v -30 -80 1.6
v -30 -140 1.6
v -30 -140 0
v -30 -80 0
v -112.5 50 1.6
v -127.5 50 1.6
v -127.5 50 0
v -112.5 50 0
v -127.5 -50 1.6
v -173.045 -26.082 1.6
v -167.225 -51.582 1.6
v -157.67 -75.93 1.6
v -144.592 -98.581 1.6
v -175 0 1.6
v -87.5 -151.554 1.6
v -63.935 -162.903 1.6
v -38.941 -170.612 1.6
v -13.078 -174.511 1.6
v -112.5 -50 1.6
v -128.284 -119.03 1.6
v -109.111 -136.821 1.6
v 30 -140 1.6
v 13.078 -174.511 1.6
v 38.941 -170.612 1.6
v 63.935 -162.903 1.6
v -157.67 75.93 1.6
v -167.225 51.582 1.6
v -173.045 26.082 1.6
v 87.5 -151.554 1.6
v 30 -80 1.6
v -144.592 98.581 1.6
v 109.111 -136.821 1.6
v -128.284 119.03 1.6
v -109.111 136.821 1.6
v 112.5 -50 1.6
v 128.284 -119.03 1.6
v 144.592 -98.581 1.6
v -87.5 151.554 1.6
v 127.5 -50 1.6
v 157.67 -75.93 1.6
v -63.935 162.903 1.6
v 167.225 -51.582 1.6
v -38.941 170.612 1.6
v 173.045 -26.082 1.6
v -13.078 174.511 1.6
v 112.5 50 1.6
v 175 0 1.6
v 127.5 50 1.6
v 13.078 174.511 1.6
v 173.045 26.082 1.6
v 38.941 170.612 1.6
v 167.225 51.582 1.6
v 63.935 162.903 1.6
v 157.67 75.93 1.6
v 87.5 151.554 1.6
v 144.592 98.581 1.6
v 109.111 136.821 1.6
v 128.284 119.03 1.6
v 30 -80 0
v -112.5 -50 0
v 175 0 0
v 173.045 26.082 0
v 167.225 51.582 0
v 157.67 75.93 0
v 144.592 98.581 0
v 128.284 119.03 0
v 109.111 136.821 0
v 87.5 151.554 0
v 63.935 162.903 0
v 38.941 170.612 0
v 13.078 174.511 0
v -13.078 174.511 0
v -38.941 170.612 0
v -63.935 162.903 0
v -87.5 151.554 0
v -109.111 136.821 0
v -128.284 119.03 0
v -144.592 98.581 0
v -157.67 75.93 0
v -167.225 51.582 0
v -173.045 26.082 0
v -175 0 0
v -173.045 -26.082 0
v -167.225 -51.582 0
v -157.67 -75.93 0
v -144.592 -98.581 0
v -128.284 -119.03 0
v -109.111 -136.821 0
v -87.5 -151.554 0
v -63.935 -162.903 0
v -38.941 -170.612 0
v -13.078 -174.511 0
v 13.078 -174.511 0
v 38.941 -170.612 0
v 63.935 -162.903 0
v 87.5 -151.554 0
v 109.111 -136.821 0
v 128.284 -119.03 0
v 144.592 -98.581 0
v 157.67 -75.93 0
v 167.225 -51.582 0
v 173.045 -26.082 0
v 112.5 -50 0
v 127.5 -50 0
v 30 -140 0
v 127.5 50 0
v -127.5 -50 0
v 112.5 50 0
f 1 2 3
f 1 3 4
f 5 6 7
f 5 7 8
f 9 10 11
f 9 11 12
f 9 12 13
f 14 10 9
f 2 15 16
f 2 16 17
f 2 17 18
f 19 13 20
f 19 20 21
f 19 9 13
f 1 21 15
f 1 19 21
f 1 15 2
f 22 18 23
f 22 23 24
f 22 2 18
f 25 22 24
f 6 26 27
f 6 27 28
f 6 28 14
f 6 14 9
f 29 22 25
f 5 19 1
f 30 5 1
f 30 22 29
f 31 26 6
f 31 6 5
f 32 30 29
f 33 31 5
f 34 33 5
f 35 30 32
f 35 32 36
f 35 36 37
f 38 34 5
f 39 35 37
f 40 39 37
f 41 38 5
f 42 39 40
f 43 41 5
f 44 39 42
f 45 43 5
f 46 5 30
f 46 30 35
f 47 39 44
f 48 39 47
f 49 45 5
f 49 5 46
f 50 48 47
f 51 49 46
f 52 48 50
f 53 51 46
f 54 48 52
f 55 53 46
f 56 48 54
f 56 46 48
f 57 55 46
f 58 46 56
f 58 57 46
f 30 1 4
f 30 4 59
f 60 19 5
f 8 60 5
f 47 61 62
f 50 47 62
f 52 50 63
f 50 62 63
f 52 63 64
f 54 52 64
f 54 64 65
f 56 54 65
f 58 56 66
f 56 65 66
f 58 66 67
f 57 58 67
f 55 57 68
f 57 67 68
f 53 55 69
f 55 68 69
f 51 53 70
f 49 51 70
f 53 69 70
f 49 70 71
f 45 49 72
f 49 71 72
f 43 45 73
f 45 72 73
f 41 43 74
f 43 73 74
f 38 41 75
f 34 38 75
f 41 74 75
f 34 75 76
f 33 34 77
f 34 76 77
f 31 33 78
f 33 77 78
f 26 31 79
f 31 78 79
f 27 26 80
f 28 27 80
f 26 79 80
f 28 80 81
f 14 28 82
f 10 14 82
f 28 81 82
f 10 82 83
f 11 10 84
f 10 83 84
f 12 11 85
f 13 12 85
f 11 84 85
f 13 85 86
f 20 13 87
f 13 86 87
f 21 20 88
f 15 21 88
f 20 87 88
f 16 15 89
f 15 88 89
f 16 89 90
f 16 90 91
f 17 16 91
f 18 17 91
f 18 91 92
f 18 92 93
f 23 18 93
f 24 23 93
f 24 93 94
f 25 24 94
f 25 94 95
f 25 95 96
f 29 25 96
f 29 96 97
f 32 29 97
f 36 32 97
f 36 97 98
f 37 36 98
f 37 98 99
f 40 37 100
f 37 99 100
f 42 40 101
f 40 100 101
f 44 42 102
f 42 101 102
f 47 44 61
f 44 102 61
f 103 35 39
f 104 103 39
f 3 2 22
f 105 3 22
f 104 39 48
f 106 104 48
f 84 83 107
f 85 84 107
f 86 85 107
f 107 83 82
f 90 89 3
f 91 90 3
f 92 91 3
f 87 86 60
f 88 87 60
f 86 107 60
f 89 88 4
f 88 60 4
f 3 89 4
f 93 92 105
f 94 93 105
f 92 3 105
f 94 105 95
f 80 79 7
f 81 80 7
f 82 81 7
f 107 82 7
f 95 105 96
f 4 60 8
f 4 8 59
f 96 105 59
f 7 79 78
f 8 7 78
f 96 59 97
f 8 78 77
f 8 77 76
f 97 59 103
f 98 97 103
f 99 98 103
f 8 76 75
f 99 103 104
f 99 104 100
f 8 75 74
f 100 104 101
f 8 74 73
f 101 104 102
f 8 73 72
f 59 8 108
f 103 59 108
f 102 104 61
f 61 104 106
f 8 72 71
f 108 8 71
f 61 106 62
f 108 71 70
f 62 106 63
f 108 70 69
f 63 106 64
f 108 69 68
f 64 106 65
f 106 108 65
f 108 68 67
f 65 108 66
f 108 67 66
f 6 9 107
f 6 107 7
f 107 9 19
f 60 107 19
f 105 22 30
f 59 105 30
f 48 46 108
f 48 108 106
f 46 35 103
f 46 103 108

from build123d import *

# Parameters (mm, degrees)
SKETCH1_R           = 175
BOSS_EXTRUDE1_DEPTH = 1.6
SKETCH2_W           = 15
SKETCH2_H           = 100
CUT_EXTRUDE1_DEPTH  = 1.6
SKETCH3_W           = 60
SKETCH3_H           = 60
CUT_EXTRUDE2_DEPTH  = 2.6


with BuildPart() as part:
    # Sketch1 → Boss-Extrude1 (new body)
    with BuildSketch(Plane.XY):
        Circle(SKETCH1_R)
    extrude(amount=BOSS_EXTRUDE1_DEPTH)

    # Sketch2 → Cut-Extrude1 (cut)
    with BuildSketch(Plane.XY.offset(1.6)):
        with Locations((-120, 0)):
            Rectangle(SKETCH2_W, SKETCH2_H)
        with Locations((120, 0)):
            Rectangle(SKETCH2_W, SKETCH2_H)
    extrude(amount=-CUT_EXTRUDE1_DEPTH, mode=Mode.SUBTRACT)

    # Sketch3 → Cut-Extrude2 (cut, through all)
    with BuildSketch(Plane.XY.offset(1.6)):
        with Locations((0, -110)):
            Rectangle(SKETCH3_W, SKETCH3_H)
    extrude(amount=-CUT_EXTRUDE2_DEPTH, mode=Mode.SUBTRACT)


solid = part.part
